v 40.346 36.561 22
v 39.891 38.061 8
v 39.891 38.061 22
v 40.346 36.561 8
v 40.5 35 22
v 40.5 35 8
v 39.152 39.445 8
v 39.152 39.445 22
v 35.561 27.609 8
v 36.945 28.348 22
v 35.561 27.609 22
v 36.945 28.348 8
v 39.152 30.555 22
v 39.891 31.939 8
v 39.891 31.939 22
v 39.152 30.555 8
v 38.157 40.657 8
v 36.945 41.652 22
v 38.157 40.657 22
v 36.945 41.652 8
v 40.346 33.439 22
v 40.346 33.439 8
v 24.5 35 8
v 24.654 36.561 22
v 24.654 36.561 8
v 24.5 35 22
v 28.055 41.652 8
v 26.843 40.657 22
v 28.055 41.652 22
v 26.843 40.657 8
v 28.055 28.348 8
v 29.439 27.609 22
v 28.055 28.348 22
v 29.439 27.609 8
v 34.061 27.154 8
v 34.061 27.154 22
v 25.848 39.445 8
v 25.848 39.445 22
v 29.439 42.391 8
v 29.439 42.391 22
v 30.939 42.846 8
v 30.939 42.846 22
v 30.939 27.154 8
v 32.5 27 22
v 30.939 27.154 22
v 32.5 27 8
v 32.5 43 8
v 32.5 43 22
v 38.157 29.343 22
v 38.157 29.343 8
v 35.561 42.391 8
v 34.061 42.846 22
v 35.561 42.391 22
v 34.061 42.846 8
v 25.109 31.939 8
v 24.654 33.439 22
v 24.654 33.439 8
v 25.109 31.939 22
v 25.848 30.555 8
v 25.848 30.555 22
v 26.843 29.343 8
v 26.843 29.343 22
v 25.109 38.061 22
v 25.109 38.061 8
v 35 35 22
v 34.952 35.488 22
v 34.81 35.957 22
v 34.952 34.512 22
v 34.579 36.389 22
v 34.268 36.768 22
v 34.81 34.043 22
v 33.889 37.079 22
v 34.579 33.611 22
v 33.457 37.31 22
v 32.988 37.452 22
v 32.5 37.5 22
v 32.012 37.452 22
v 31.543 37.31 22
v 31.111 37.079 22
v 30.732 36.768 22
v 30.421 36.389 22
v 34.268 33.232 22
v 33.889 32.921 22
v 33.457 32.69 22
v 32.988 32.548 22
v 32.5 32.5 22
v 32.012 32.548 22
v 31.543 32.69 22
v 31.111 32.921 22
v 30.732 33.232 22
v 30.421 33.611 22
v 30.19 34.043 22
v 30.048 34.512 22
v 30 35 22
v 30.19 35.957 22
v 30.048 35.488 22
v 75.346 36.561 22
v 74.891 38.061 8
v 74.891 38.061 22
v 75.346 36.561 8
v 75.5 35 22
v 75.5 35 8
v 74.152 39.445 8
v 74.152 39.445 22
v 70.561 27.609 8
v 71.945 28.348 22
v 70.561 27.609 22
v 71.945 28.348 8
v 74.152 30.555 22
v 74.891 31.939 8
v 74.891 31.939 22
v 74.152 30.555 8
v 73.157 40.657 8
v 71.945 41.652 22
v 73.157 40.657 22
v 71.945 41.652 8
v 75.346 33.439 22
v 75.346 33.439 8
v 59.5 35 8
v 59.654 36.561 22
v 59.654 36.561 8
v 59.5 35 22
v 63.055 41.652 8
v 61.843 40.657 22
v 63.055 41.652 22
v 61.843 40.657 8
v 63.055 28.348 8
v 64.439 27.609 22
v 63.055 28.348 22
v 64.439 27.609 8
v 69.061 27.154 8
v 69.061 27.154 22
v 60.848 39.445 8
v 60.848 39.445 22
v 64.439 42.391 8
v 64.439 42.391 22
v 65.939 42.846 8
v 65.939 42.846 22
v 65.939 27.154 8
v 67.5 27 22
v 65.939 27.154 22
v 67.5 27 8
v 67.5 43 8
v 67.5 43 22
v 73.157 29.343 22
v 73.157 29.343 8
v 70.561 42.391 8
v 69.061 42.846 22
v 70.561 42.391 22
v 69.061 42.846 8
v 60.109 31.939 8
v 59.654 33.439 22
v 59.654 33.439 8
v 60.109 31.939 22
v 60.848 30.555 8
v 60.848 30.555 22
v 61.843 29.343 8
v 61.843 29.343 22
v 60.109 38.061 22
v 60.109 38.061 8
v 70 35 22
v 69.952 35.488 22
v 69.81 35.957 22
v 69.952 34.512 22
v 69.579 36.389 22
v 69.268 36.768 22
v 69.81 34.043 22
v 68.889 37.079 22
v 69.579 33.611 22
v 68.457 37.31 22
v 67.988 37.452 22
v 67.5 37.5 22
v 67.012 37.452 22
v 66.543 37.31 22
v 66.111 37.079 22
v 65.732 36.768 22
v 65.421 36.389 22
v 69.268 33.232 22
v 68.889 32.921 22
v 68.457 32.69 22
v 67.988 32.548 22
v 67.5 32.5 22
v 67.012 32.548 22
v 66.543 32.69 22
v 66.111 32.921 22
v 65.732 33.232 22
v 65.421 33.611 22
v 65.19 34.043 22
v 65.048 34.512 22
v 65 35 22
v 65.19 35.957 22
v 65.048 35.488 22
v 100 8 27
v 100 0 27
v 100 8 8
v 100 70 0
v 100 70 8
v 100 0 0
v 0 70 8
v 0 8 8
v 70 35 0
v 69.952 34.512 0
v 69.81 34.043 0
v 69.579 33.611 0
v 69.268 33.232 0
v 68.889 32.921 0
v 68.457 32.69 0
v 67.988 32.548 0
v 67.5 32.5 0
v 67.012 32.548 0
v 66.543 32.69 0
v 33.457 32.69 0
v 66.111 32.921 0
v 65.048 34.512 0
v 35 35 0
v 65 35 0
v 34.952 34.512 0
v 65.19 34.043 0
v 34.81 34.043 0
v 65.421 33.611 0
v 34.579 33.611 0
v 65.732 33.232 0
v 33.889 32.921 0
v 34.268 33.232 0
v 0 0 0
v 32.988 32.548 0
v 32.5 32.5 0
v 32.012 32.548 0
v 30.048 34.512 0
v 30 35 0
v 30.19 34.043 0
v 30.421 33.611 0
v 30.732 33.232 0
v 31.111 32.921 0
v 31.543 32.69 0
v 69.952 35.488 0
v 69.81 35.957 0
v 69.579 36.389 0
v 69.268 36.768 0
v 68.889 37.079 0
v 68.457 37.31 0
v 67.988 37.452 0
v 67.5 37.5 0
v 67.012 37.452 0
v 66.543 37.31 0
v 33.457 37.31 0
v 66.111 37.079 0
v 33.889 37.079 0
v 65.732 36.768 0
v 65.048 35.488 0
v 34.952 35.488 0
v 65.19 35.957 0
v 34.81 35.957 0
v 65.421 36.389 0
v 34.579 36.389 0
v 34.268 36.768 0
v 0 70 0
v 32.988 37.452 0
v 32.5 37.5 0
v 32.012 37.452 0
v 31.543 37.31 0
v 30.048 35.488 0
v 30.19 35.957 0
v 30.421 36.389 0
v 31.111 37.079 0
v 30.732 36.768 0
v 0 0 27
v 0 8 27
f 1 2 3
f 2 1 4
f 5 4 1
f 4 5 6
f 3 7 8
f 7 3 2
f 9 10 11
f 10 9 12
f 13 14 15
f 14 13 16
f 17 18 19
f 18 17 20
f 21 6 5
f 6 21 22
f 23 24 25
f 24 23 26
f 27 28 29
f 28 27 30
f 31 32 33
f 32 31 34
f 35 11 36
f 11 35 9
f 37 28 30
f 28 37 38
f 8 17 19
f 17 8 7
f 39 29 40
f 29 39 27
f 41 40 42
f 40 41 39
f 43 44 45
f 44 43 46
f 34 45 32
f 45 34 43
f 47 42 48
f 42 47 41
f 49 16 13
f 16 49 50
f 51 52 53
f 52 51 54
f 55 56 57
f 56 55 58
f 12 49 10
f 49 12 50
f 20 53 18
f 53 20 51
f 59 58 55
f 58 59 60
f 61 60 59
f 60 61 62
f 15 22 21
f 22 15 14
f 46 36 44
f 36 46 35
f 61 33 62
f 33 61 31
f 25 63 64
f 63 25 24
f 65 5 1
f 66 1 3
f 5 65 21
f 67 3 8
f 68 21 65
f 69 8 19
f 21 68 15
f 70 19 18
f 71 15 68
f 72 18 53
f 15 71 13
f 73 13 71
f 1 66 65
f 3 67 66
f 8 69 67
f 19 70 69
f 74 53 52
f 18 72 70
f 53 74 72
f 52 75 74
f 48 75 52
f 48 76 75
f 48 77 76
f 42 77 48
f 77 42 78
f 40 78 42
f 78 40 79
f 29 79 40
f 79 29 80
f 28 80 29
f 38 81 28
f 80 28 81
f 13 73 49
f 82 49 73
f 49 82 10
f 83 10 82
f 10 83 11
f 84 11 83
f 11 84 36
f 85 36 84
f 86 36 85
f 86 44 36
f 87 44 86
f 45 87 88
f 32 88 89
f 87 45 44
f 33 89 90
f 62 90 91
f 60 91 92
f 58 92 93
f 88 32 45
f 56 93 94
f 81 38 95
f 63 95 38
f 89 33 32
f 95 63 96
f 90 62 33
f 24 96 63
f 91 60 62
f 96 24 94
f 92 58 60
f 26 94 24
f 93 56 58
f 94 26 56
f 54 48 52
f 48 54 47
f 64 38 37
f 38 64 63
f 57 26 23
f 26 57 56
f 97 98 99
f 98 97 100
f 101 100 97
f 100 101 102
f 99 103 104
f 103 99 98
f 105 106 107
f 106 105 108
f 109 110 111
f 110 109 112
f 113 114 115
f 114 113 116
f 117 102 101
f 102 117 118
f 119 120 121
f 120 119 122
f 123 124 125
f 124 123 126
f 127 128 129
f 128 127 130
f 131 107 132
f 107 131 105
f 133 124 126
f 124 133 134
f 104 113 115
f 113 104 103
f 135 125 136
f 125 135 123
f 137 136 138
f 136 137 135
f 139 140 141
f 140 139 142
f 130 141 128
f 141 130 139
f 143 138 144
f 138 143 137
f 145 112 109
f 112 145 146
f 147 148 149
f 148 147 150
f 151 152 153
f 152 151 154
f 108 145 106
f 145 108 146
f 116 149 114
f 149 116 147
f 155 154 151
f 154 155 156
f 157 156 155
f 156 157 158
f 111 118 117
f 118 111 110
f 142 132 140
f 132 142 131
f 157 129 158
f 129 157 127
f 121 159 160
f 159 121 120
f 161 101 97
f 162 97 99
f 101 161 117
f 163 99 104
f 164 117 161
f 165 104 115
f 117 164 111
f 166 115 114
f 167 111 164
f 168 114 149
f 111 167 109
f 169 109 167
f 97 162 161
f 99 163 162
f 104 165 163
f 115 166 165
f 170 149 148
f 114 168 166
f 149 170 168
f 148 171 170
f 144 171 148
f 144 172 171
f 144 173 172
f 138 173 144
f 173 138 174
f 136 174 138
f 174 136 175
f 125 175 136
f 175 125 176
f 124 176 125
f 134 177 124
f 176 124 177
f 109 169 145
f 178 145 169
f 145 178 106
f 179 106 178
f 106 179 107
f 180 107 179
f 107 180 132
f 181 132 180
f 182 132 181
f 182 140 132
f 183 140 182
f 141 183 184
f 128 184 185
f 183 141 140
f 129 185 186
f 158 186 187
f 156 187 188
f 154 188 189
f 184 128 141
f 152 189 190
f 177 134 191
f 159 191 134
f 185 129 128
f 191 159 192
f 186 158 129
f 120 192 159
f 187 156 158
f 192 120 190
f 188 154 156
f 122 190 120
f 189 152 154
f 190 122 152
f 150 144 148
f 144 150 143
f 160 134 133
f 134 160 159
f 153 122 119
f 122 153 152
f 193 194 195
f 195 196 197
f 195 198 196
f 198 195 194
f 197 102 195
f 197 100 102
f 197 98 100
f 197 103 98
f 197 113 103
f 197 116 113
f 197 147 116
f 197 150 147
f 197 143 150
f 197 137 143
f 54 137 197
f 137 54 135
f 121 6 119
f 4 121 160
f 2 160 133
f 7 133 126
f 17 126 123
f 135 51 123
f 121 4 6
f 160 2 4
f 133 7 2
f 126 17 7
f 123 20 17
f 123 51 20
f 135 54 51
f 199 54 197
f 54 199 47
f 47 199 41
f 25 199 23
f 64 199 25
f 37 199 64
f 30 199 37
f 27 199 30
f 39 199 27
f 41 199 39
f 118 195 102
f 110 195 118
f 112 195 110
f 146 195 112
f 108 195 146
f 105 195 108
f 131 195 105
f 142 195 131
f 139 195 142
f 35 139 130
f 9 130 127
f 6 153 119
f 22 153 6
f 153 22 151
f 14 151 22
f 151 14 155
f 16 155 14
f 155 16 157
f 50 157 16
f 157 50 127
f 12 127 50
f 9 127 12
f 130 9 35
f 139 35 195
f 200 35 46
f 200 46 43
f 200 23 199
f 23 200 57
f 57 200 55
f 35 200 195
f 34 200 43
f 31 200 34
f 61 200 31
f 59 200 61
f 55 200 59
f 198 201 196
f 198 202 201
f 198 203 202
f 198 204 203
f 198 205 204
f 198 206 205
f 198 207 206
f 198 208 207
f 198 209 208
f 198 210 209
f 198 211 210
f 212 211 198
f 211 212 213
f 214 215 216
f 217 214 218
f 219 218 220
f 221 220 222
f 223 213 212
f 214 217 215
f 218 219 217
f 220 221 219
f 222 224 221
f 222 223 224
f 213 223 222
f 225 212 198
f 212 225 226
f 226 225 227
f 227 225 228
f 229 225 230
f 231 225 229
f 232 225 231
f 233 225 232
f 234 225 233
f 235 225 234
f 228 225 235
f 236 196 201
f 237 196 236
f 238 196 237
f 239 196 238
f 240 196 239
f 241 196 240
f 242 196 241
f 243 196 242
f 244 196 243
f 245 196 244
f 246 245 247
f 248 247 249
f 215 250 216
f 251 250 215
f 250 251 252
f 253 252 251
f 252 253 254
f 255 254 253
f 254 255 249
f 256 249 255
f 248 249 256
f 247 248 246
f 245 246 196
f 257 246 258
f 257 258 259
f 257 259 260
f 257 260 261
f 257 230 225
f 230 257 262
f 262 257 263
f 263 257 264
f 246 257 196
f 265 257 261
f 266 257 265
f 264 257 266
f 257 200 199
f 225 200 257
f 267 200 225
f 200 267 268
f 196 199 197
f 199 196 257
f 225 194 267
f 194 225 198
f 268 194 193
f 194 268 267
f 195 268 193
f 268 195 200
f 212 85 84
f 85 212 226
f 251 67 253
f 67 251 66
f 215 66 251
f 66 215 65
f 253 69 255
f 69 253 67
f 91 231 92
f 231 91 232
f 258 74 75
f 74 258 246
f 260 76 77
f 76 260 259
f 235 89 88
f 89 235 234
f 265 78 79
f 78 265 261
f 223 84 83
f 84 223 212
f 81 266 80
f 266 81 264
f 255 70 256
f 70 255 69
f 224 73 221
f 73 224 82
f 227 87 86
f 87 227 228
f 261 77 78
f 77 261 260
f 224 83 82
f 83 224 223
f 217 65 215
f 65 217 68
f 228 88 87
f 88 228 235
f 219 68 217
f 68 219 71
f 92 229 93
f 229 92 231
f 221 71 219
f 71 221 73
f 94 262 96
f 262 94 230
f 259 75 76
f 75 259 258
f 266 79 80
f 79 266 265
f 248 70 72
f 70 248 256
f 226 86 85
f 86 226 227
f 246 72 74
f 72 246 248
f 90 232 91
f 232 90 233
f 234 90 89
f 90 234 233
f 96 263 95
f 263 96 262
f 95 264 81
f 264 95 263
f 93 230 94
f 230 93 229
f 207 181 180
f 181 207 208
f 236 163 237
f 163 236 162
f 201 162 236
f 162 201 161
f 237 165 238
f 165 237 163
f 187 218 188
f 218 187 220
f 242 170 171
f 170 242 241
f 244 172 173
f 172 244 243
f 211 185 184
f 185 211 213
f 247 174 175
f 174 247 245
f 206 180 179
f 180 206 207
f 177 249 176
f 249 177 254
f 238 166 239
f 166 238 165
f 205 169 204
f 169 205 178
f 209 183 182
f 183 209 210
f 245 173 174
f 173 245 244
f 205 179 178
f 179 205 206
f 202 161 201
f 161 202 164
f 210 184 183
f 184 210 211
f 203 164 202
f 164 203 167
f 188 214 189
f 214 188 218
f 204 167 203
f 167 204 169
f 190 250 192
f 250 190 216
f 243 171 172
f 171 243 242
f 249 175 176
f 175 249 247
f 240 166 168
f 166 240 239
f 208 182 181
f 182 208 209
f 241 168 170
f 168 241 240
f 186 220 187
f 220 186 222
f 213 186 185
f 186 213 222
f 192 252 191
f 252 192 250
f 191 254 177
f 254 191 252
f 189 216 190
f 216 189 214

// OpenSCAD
$fn = 32;

// ----------------------------------------------------------------------
// Drill jig: fence jig
// ----------------------------------------------------------------------

// --- parameters (mm) ---
plate_l = 100;            // plate length, X
plate_w = 70;             // plate width, Y
plate_t = 8;              // plate thickness
boss_d = 16;              // guide boss diameter
boss_h = 15;              // boss height above the plate
guide_d = 5;              // guide hole diameter
boss_pitch = 35;          // boss pitch
fence_h = 20;             // fence height above the plate
fence_t = 8;              // fence thickness

n_boss = 2;  // guide bosses
boss_x0 = (plate_l - (n_boss - 1) * boss_pitch) / 2;  // first boss X
boss_top = plate_t - 1 + boss_h;  // boss crown height
fence_top = plate_t - 1 + fence_h;  // fence crown height
total_h = max([fence_top, boss_top]);  // overall height

difference() {
  union() {
  cube([plate_l, plate_w, plate_t]);
  for (i = [0 : n_boss - 1])
    translate([boss_x0 + i * boss_pitch, plate_w / 2, plate_t - 1])
      cylinder(h = boss_h, d = boss_d);
  translate([0, 0, plate_t - 1]) cube([plate_l, fence_t, fence_h]);
  }
  for (i = [0 : n_boss - 1])
    translate([boss_x0 + i * boss_pitch, plate_w / 2, -1])
      cylinder(h = plate_t + boss_h, d = guide_d);
}
